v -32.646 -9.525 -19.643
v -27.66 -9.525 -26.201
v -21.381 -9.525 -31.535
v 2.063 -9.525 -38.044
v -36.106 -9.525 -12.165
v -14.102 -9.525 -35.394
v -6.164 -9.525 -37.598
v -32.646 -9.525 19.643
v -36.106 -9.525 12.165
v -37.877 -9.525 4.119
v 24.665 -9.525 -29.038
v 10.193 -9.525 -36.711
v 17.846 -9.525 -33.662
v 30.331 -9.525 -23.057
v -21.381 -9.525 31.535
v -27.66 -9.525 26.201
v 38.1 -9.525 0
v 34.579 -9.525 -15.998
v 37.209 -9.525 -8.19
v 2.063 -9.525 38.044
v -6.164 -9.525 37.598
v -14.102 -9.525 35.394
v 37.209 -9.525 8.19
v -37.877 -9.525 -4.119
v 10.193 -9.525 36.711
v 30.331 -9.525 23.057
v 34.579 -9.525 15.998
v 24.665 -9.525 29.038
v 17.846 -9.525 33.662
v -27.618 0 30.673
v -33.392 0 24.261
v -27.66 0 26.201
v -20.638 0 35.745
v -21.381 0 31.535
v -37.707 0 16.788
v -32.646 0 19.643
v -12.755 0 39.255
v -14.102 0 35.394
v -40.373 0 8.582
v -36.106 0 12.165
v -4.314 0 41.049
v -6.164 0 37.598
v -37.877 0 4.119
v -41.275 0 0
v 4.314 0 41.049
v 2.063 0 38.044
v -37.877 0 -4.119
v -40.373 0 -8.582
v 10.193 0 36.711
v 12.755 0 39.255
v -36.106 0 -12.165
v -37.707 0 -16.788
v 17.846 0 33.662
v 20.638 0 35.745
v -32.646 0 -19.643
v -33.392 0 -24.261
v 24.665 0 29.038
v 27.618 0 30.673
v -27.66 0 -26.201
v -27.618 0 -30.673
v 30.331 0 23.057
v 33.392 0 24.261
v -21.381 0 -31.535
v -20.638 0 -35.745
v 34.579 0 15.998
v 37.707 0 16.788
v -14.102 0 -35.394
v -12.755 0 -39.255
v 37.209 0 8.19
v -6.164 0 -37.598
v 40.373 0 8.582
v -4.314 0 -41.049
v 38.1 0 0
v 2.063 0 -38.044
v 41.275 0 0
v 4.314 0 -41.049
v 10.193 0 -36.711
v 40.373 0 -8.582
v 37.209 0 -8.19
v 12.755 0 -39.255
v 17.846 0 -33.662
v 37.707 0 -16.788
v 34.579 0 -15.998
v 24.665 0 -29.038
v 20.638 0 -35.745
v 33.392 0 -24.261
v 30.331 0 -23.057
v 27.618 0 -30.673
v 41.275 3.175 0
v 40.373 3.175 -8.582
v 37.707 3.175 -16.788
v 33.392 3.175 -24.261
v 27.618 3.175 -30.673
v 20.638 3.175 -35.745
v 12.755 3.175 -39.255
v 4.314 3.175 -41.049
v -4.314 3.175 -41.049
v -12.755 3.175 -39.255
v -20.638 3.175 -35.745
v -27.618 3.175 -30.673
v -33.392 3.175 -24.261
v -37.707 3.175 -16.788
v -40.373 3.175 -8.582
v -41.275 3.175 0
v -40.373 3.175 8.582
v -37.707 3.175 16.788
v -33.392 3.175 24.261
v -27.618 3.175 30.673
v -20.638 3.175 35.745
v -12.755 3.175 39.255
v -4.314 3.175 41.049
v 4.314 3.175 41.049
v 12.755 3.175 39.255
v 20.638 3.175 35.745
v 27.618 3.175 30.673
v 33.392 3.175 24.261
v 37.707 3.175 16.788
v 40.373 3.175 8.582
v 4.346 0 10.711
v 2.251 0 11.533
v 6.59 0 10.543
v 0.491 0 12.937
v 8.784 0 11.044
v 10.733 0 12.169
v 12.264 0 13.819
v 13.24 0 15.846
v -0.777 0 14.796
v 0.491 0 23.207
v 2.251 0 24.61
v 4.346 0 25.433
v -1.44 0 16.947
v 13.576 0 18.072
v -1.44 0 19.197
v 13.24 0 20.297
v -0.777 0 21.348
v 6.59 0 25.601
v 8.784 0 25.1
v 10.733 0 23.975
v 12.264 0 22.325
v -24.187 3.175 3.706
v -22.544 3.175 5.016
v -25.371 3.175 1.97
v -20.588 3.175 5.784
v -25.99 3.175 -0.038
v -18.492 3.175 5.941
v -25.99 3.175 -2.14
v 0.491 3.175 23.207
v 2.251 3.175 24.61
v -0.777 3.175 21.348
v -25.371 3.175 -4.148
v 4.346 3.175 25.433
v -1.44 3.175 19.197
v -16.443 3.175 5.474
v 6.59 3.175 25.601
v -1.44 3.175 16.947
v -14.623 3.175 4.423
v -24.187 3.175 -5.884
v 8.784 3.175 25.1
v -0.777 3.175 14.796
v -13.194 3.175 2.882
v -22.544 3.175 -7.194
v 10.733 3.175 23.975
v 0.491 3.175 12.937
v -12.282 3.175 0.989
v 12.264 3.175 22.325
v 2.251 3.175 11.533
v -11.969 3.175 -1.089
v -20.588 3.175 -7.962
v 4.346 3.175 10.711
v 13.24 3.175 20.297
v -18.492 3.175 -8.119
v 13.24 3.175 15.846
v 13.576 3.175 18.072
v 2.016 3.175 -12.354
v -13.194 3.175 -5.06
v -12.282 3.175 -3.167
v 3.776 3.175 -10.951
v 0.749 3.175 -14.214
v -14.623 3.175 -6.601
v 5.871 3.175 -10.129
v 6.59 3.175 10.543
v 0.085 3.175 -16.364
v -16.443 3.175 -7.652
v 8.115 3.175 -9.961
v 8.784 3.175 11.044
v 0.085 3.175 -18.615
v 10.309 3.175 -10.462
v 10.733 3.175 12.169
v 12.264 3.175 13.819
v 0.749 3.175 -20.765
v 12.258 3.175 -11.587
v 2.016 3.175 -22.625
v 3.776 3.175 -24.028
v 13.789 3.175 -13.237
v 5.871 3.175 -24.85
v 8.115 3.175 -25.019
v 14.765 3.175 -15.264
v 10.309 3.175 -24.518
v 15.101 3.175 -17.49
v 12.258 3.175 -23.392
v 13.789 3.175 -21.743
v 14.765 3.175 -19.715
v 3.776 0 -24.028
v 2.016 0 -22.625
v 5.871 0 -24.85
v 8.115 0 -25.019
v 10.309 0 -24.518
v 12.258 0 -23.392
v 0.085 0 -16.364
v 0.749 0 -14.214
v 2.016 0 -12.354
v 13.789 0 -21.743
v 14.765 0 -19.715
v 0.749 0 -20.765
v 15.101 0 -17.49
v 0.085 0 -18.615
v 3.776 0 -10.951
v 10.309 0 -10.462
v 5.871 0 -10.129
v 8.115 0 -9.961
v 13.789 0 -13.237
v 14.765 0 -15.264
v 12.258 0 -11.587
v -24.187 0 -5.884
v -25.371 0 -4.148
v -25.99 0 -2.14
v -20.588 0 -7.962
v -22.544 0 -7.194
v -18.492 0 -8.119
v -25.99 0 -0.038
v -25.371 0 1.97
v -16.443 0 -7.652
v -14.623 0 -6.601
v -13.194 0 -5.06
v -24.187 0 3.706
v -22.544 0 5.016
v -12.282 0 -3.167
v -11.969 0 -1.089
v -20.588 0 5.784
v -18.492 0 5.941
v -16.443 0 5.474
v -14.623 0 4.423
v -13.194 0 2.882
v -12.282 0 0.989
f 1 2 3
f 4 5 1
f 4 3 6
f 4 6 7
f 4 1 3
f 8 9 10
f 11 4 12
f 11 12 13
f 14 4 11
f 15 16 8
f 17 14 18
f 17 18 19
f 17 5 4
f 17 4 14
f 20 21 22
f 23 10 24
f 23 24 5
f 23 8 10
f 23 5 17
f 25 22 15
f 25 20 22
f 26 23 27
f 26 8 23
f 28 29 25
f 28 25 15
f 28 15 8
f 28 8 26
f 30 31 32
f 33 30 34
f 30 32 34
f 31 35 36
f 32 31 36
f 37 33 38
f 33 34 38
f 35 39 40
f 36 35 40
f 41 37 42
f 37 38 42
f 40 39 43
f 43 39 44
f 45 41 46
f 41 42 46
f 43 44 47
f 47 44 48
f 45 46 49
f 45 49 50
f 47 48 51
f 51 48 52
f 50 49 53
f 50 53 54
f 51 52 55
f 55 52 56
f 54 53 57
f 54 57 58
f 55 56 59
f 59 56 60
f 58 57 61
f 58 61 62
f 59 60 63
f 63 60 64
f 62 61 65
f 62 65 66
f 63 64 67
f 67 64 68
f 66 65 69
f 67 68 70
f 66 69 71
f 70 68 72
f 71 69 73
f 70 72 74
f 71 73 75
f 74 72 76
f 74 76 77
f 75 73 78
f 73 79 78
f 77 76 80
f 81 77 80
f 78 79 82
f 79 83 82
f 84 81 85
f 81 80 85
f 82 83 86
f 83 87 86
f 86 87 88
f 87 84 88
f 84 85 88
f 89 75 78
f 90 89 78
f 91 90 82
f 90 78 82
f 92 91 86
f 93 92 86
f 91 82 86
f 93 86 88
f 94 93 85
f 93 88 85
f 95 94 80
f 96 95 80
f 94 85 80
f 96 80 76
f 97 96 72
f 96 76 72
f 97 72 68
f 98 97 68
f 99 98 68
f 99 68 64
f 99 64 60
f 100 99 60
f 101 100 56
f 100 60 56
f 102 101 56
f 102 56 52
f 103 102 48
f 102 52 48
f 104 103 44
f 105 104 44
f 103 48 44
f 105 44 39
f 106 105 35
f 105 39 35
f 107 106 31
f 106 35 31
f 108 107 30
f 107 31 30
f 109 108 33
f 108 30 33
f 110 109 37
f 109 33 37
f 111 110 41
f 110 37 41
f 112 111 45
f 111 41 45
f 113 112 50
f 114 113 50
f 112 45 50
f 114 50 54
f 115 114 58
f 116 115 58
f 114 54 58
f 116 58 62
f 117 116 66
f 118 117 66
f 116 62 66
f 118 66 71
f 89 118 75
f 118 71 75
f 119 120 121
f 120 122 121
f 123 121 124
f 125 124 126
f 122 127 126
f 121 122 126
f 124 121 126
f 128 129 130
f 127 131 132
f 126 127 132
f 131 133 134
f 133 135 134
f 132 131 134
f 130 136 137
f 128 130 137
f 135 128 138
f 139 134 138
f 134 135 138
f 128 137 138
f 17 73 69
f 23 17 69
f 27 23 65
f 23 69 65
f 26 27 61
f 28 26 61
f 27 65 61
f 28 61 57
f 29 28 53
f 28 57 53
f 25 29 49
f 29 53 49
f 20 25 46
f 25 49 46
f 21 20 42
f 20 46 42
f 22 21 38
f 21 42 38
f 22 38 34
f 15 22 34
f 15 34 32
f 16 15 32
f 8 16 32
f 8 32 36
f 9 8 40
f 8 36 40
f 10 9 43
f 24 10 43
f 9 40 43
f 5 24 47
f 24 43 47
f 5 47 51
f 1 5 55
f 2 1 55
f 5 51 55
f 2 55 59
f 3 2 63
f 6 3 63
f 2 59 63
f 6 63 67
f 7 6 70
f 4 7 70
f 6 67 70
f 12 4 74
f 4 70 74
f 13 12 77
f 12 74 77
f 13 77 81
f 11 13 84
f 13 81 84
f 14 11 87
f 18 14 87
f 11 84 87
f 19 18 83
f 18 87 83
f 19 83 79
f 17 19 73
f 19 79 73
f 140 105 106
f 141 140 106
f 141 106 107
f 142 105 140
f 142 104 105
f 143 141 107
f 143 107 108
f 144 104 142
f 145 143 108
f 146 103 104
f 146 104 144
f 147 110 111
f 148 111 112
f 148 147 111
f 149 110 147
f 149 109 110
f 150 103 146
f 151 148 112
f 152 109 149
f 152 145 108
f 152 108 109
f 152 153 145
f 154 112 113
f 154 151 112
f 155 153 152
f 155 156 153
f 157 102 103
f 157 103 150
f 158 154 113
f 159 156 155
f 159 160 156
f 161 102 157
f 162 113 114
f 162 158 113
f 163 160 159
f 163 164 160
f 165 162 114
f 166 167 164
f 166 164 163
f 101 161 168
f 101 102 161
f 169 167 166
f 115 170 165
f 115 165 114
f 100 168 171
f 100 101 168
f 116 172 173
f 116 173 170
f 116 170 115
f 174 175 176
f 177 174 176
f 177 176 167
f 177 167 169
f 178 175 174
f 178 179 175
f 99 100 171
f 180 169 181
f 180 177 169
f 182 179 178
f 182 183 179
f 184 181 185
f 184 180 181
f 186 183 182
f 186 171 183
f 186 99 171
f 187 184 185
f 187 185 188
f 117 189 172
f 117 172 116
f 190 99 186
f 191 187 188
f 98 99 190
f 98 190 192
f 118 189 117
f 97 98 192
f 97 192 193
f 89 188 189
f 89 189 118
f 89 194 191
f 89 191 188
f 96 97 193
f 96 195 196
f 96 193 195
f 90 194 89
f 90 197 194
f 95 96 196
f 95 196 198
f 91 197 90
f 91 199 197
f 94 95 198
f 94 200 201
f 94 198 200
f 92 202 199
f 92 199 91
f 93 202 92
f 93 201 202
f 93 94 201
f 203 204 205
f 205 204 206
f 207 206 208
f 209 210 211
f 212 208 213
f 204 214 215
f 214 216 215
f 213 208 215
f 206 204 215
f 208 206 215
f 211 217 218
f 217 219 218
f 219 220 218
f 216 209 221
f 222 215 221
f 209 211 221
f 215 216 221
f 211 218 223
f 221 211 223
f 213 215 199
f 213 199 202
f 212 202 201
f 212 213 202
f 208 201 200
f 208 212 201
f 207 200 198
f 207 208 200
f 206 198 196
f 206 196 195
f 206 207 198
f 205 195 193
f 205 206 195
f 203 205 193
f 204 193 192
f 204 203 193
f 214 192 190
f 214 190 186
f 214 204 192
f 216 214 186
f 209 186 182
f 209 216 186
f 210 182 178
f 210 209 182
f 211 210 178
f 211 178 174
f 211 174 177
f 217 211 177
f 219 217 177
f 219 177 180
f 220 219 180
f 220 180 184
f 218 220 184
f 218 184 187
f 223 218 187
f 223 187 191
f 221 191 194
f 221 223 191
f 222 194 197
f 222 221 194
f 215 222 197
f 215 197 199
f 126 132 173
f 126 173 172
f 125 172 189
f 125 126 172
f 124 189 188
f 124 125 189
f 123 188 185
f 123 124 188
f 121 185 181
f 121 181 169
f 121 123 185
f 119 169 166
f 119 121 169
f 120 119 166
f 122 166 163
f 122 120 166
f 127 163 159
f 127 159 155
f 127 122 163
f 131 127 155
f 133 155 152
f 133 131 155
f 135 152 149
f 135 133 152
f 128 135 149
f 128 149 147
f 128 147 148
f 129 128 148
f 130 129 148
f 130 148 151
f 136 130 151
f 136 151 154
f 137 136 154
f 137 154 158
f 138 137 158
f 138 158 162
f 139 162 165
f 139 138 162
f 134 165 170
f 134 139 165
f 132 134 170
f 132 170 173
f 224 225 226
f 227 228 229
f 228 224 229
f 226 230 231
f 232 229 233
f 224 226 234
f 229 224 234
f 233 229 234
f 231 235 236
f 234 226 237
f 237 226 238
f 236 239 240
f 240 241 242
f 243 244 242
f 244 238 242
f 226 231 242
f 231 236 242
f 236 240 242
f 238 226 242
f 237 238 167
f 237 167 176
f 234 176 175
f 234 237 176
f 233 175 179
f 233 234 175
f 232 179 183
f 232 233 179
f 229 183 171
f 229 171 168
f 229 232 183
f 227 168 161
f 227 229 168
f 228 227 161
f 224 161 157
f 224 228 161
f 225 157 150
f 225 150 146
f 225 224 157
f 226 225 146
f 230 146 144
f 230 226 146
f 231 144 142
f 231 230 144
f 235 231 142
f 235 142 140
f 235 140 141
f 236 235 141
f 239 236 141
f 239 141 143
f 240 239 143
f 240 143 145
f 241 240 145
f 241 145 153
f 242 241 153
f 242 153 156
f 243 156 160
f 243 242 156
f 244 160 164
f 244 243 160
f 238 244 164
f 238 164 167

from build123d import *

# Parameters (mm, degrees)
SKETCH1_R           = 41.275
SKETCH1_R_2         = 7.05
SKETCH1_R_3         = 7.55
BOSS_EXTRUDE1_DEPTH = 3.175
SKETCH2_R           = 38.1
BOSS_EXTRUDE2_DEPTH = 9.525


with BuildPart() as part:
    # Sketch1 → Boss-Extrude1 (new body)
    with BuildSketch(Plane(origin=(0, 0, 0), x_dir=(1, 0, 0), z_dir=(0, 1, 0))):
        Circle(SKETCH1_R)
        with Locations((-19.018847828, 1.089002884)):
            Circle(SKETCH1_R_2, mode=Mode.SUBTRACT)
        with Locations((6.025718442, -18.071890251)):
            Circle(SKETCH1_R_3, mode=Mode.SUBTRACT)
        with Locations((7.550830576, 17.489638578)):
            Circle(SKETCH1_R_3, mode=Mode.SUBTRACT)
    extrude(amount=BOSS_EXTRUDE1_DEPTH)

    # Sketch2 → Boss-Extrude2 (add)
    with BuildSketch(Plane.XZ):
        Circle(SKETCH2_R)
    extrude(amount=BOSS_EXTRUDE2_DEPTH)


solid = part.part
